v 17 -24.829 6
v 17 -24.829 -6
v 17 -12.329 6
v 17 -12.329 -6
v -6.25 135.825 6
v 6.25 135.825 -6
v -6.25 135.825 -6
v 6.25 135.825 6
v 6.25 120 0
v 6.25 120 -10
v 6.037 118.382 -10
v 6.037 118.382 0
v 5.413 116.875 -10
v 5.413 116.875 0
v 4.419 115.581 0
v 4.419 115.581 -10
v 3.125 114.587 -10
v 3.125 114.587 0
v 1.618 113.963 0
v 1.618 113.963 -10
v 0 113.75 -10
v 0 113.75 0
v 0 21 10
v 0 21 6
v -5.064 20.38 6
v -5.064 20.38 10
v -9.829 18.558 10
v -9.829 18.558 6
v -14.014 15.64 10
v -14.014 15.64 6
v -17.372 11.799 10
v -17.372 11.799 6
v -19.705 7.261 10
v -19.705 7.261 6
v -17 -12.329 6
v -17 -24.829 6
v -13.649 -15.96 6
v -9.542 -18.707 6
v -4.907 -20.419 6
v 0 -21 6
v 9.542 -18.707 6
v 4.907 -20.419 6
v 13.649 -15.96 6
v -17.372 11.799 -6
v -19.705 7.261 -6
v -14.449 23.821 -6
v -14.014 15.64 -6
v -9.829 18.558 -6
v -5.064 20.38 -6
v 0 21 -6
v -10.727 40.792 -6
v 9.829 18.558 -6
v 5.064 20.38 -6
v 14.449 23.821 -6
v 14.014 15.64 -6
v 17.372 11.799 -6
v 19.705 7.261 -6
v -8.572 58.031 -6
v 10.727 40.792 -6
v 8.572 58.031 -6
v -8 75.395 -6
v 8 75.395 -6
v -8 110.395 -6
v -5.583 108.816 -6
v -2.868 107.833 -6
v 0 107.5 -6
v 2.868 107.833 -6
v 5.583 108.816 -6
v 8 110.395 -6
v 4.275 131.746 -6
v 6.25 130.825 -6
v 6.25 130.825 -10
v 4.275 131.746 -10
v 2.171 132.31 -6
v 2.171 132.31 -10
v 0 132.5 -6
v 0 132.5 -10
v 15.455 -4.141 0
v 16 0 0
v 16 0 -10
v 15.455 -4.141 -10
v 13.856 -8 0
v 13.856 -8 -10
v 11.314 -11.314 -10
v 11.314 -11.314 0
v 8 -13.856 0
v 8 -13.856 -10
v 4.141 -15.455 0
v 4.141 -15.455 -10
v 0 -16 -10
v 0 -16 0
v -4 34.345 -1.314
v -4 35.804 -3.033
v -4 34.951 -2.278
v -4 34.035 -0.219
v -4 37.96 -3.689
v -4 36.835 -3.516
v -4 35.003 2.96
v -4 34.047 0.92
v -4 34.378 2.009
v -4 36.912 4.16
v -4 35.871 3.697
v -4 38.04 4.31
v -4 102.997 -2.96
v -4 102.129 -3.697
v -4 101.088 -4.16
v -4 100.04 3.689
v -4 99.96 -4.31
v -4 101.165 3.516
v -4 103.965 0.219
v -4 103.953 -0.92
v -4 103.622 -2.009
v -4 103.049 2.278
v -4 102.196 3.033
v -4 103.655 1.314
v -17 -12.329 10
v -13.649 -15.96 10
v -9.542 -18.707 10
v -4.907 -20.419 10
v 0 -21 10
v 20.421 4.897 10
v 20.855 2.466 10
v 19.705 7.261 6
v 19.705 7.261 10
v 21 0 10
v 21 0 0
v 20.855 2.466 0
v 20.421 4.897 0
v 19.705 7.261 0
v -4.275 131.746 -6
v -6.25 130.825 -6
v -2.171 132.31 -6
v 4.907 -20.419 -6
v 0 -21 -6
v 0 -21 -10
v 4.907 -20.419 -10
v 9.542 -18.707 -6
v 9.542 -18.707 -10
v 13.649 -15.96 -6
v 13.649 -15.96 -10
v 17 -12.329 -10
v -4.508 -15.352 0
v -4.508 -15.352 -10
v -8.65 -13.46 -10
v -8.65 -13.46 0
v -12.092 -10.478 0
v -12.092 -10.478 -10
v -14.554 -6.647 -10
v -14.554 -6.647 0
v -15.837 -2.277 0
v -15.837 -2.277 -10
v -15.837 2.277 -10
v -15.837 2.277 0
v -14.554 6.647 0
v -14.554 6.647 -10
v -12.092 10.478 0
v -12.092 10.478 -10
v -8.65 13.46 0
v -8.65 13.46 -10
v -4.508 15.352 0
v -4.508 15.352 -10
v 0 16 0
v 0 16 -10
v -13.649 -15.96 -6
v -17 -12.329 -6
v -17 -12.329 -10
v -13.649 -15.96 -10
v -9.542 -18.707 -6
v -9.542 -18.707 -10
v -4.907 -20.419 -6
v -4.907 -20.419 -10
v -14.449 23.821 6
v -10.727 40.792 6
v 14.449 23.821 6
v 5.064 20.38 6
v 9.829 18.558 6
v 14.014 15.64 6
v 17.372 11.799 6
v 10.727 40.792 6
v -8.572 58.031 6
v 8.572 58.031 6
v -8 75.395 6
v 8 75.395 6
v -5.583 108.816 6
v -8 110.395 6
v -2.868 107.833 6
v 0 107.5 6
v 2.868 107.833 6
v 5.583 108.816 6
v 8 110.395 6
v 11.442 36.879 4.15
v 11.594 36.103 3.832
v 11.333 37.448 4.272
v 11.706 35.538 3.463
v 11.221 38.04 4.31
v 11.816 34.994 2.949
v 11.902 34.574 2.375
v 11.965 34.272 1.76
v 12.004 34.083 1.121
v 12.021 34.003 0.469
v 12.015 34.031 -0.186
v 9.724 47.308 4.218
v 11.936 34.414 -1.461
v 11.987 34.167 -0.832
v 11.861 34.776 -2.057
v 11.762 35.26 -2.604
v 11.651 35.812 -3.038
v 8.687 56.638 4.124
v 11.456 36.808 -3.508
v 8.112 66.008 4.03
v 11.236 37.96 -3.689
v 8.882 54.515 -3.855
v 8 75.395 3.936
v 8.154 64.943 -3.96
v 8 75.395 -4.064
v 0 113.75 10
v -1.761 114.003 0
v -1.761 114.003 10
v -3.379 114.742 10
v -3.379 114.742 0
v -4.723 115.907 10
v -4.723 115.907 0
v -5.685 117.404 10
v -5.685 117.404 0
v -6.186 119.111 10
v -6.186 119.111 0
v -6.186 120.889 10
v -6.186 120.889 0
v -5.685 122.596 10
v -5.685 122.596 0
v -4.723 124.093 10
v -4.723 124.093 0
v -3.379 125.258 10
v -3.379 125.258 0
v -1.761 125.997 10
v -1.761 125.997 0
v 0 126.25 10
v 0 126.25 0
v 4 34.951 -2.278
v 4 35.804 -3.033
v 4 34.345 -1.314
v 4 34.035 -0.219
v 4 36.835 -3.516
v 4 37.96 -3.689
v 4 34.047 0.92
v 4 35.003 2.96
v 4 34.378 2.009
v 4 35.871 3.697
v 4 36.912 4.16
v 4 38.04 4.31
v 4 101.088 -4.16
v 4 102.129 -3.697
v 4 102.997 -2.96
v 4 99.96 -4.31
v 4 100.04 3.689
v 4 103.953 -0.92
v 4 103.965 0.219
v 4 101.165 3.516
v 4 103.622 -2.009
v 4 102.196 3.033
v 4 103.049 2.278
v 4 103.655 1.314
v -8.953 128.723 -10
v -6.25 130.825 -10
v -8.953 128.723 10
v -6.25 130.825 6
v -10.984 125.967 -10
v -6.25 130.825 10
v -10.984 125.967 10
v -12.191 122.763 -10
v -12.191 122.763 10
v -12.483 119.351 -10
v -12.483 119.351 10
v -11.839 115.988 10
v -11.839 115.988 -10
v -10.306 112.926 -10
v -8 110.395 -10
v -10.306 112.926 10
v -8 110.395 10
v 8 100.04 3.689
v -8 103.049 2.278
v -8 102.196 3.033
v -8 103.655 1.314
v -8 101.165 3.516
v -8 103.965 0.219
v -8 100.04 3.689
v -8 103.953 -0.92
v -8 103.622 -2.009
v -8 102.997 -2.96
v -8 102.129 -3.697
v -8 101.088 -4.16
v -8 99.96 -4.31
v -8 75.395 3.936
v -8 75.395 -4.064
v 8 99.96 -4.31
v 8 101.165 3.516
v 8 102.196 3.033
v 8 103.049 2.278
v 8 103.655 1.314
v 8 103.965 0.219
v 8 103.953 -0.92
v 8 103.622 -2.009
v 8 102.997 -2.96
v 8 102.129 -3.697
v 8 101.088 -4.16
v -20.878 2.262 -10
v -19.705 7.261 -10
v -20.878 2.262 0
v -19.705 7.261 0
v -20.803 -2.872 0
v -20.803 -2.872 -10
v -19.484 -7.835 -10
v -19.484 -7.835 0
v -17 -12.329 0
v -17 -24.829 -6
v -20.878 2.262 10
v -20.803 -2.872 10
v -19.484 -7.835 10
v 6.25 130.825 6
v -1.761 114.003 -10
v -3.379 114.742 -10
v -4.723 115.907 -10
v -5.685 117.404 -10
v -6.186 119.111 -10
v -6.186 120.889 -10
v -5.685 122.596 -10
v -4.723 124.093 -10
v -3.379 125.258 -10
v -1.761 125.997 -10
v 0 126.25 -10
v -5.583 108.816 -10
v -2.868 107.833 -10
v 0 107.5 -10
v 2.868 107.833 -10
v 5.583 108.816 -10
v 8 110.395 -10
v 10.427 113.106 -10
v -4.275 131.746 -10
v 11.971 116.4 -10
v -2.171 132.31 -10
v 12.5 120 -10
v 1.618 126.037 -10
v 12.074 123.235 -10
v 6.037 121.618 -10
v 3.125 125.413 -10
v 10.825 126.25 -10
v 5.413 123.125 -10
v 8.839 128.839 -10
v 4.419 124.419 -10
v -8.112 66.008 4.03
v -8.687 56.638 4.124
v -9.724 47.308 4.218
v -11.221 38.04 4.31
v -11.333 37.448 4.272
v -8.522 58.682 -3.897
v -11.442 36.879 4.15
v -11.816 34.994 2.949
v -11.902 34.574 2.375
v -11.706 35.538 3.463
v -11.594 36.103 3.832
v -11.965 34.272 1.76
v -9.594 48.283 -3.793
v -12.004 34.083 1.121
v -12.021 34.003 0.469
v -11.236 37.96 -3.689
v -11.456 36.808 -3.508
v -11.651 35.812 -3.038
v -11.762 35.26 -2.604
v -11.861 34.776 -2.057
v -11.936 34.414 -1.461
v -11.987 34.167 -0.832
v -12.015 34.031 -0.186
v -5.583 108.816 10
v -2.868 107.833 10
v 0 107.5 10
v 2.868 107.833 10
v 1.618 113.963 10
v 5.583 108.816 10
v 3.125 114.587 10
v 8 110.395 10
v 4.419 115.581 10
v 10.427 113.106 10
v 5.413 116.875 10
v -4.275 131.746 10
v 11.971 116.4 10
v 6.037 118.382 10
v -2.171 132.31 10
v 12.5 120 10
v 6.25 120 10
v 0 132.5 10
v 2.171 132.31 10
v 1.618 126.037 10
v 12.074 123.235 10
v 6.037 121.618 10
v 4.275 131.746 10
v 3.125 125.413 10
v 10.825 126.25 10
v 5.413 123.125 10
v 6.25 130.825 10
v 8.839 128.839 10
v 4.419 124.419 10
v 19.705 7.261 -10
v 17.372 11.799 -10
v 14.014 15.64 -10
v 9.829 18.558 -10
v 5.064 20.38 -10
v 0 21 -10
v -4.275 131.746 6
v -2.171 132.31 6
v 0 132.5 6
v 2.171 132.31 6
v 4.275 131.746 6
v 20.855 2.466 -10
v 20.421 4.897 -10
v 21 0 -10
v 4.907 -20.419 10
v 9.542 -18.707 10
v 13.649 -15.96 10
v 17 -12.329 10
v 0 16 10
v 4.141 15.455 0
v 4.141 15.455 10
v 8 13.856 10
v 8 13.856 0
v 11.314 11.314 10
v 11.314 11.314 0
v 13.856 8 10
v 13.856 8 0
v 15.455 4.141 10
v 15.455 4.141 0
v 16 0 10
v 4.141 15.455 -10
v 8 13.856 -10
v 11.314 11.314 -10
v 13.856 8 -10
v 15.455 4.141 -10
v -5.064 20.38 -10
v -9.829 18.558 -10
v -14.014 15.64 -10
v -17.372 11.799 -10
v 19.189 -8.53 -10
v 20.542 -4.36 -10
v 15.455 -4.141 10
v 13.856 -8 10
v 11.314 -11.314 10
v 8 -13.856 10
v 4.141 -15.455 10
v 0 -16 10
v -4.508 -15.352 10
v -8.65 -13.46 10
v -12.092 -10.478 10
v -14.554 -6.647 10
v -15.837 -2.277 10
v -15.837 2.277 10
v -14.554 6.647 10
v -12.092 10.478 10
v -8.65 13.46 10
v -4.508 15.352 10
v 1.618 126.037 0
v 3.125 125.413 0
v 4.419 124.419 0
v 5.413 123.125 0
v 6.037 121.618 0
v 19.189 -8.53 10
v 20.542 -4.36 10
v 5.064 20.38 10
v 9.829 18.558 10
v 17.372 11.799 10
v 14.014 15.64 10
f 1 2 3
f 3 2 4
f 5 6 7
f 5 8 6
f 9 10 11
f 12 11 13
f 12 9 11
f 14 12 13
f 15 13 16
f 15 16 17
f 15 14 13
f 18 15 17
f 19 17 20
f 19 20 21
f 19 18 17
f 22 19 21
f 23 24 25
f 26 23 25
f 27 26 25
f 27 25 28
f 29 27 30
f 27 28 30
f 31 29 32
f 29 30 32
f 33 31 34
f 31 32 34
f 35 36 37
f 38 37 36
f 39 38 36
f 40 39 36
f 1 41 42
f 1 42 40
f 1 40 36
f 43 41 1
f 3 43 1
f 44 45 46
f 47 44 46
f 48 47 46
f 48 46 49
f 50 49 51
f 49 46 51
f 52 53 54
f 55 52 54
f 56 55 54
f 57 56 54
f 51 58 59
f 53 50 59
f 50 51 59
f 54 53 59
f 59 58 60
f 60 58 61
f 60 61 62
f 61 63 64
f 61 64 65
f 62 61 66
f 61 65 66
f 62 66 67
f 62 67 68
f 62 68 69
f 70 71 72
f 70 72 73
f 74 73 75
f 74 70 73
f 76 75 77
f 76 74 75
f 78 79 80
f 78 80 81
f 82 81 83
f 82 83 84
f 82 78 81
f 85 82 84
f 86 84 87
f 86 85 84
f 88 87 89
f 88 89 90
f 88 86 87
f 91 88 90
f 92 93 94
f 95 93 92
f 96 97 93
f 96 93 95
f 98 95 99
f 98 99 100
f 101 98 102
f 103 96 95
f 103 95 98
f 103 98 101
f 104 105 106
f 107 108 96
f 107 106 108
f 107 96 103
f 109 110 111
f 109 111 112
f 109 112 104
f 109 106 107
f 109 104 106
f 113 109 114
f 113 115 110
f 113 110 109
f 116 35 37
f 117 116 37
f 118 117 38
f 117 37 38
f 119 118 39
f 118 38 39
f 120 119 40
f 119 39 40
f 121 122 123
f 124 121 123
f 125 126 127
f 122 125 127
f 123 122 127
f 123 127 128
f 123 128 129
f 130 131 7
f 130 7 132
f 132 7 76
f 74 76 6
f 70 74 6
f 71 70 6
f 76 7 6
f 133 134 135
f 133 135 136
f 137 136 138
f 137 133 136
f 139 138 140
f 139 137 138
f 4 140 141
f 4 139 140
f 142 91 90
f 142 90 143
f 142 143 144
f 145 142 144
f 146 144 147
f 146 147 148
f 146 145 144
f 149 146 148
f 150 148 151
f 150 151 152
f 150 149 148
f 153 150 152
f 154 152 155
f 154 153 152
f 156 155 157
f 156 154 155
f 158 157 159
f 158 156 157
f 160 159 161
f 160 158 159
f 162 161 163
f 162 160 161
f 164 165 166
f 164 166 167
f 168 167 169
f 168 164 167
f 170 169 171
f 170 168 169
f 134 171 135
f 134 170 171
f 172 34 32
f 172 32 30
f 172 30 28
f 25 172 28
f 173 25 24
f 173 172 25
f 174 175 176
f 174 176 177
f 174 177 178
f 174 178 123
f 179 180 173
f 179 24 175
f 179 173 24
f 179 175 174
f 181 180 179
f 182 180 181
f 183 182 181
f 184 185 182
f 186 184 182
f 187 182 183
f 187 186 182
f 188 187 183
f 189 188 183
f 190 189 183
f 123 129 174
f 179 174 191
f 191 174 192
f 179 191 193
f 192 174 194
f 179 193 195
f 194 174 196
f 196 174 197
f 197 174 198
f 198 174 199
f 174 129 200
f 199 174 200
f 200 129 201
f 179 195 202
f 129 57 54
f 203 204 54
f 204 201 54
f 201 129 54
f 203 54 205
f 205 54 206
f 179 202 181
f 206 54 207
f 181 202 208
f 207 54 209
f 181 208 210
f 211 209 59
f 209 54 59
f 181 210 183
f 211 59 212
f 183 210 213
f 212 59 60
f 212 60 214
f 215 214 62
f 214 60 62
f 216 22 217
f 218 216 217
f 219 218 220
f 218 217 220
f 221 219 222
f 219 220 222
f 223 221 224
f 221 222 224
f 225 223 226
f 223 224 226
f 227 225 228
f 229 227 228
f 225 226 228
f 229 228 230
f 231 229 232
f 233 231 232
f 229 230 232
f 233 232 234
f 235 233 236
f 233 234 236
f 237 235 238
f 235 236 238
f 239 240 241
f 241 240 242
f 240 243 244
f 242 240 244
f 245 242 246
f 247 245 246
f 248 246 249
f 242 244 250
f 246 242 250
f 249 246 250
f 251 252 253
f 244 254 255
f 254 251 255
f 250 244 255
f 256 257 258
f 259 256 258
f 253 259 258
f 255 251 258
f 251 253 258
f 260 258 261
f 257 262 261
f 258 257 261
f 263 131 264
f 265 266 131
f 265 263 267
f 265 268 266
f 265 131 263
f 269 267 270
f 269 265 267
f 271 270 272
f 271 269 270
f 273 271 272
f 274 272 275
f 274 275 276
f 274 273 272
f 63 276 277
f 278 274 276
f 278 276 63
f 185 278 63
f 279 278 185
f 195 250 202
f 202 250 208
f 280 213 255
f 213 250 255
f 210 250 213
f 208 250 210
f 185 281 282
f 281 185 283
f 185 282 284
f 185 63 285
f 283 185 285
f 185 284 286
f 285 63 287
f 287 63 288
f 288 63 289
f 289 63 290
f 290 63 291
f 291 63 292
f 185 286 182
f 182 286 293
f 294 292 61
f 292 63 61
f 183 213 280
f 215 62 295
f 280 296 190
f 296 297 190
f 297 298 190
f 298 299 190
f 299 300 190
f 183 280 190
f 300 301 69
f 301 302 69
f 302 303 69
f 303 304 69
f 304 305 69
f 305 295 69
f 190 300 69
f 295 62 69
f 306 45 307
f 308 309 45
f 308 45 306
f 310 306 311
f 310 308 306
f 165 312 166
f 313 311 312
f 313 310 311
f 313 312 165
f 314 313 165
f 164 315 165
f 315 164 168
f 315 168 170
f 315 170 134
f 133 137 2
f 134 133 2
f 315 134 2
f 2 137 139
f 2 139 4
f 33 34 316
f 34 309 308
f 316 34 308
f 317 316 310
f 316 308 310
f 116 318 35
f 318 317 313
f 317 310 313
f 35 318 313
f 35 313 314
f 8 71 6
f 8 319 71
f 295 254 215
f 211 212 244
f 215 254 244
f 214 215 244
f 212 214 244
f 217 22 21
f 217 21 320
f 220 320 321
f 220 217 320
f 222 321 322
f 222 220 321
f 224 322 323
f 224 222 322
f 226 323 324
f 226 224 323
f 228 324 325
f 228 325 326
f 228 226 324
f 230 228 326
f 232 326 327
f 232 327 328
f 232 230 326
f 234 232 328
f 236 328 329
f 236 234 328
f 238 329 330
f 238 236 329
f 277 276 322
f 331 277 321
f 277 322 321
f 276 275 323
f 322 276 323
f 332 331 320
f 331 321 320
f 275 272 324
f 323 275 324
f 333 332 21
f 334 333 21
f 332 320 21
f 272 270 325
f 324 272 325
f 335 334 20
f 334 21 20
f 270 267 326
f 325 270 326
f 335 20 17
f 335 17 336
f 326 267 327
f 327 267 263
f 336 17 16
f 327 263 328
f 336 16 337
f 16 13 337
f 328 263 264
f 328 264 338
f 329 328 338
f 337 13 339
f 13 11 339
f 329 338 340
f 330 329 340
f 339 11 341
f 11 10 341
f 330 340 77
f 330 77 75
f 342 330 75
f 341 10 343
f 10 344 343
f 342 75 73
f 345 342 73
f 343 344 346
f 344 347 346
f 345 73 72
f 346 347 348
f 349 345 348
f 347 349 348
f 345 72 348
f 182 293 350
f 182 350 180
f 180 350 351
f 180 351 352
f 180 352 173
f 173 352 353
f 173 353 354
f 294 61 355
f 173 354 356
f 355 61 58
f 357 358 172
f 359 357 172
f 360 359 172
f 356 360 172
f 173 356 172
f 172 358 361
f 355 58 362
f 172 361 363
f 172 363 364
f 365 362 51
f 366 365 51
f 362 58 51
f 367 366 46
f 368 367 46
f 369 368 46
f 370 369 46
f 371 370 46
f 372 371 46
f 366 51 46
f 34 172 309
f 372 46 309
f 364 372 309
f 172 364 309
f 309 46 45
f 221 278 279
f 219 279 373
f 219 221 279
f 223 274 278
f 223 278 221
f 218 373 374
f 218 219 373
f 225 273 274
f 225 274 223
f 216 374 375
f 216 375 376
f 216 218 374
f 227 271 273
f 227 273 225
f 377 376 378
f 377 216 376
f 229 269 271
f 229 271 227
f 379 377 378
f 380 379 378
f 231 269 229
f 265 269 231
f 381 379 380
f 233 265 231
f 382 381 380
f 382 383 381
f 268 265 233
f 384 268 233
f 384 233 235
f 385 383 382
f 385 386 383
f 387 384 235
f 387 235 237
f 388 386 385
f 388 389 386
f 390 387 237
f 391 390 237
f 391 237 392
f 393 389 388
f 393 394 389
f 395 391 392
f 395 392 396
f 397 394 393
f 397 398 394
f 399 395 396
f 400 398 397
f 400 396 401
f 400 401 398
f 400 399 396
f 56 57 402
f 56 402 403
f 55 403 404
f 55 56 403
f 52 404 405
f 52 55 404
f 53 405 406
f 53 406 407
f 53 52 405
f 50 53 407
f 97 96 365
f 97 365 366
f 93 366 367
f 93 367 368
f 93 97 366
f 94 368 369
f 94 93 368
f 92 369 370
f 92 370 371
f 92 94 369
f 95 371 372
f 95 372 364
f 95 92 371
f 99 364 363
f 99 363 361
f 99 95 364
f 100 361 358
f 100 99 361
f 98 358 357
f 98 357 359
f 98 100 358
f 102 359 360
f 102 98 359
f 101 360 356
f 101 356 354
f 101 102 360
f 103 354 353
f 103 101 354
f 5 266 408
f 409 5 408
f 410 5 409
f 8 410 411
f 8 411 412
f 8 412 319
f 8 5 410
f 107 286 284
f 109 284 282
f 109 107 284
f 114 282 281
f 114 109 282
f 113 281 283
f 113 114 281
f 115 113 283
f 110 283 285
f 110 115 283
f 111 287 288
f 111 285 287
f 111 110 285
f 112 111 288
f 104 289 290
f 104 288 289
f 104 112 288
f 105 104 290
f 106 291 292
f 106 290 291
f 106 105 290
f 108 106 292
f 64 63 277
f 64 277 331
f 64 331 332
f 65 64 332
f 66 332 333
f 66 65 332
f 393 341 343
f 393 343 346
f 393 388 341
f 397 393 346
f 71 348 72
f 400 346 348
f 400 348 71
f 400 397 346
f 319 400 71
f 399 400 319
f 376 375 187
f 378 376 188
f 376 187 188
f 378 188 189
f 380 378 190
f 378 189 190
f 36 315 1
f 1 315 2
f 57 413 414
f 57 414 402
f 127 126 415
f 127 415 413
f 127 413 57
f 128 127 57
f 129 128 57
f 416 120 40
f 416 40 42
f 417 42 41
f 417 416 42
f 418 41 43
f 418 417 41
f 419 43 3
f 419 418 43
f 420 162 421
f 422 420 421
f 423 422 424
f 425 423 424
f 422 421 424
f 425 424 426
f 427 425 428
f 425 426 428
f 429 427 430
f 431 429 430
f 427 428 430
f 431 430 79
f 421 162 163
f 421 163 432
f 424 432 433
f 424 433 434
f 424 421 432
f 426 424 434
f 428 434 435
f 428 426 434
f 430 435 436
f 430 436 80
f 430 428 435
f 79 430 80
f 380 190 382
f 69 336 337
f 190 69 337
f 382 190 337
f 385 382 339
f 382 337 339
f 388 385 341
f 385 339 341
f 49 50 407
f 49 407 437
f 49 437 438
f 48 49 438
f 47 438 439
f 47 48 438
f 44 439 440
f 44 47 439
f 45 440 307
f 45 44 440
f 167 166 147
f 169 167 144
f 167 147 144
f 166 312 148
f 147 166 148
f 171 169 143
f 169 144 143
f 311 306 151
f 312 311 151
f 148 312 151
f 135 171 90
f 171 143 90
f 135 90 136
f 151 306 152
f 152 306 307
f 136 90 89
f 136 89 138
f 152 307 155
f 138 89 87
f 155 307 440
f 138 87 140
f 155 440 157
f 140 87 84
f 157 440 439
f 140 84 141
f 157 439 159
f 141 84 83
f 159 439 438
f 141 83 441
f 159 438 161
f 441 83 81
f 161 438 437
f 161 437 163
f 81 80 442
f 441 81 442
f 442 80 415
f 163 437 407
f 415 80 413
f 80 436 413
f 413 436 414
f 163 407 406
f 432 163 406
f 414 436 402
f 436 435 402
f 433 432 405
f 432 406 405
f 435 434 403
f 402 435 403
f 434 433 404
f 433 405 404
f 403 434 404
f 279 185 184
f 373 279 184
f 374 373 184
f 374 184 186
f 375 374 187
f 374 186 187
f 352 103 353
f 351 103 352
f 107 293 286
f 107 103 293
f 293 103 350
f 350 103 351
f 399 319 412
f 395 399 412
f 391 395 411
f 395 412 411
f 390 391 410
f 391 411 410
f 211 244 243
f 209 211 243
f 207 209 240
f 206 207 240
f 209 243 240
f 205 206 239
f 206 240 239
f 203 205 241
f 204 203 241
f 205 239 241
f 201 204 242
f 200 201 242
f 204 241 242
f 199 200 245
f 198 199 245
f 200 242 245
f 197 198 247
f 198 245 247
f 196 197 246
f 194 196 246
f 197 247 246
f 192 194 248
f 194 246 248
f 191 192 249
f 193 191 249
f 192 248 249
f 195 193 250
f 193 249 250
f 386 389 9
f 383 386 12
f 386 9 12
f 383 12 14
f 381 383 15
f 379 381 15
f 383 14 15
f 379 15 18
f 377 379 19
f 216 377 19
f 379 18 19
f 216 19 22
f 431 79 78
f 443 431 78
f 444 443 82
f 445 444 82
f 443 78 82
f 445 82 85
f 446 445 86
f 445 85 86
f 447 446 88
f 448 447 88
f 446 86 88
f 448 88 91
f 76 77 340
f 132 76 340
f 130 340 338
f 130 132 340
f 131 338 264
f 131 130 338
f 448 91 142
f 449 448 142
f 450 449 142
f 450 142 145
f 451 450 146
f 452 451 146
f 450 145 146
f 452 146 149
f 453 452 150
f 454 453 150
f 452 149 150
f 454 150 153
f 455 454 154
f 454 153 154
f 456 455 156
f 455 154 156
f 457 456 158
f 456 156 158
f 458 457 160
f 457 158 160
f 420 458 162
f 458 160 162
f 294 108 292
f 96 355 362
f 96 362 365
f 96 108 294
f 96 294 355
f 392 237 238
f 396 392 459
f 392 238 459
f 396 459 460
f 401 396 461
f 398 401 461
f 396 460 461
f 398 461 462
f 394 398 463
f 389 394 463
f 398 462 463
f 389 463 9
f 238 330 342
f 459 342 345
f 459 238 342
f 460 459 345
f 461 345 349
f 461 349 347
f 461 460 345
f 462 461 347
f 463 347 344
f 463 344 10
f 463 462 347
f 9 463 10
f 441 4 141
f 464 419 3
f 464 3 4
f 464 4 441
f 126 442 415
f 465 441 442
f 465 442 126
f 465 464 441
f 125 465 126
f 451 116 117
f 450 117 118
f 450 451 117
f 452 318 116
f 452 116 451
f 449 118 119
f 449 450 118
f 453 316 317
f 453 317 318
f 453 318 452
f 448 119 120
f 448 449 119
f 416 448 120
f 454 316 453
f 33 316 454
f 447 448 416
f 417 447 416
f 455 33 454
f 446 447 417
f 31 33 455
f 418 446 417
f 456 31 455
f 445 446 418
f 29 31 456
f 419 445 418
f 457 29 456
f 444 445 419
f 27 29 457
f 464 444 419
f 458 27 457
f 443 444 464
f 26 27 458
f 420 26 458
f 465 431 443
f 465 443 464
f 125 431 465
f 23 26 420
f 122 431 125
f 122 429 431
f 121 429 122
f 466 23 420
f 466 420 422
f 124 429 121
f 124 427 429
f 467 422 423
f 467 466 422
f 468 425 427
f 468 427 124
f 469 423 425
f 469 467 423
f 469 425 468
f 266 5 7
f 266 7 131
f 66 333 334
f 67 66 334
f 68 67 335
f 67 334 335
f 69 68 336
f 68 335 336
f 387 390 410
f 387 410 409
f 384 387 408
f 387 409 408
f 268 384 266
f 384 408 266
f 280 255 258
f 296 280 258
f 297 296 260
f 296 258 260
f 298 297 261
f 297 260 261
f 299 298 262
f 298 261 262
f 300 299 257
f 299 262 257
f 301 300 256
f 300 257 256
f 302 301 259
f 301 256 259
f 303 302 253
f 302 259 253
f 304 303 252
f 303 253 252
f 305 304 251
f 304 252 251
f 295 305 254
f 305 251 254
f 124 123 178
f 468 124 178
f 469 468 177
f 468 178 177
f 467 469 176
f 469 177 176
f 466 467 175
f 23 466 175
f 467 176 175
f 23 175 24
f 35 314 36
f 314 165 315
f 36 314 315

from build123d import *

# Parameters (mm, degrees)
SKETCH1_R             = 12.5
SKETCH1_R_2           = 6.25
BOSS_EXTRUDE2_DEPTH   = 10
SKETCH1_R_3           = 21
SKETCH1_R_4           = 16
BOSS_EXTRUDE2_2_DEPTH = 10
BOSS_EXTRUDE3_DEPTH   = 6
CUT_EXTRUDE1_START    = 4
CUT_EXTRUDE1_DEPTH    = 140.802456026


with BuildPart() as part:
    # Sketch1 → Boss-Extrude2 (new, symmetric)
    with BuildSketch(Plane.XY):
        with Locations((0, 120)):
            Circle(SKETCH1_R)
        with Locations((0, 120)):
            Circle(SKETCH1_R_2, mode=Mode.SUBTRACT)
    extrude(amount=BOSS_EXTRUDE2_DEPTH, both=True)



with BuildPart() as body_2:
    # Sketch1 → Boss-Extrude2 2 (new, symmetric)
    with BuildSketch(Plane.XY):
        Circle(SKETCH1_R_3)
        Circle(SKETCH1_R_4, mode=Mode.SUBTRACT)
    extrude(amount=BOSS_EXTRUDE2_2_DEPTH, both=True)


with BuildPart() as part_1:
    add(part.part)

    add(body_2.part)  # Boss-Extrude3 merges body 2
    # Sketch1<7> → Boss-Extrude3 (add, symmetric)
    with BuildSketch(Plane.XY):
        with BuildLine():
            Line((6.25, 135.825317547), (-6.25, 135.825317547))
            Line((-6.25, 135.825317547), (-6.25, 130.825317547))
            ThreePointArc((-6.25, 130.825317547), (0, 132.5), (6.25, 130.825317547))
            Line((6.25, 130.825317547), (6.25, 135.825317547))
        make_face()
        with BuildLine():
            Line((-8, 110.395313644), (-8, 75.395313644))
            ThreePointArc((-8, 75.395313644), (-10.727396888, 40.791551261), (-19.704607906, 7.261434244))
            ThreePointArc((-19.704607906, 7.261434244), (0, 21), (19.704607906, 7.261434244))
            ThreePointArc((19.704607906, 7.261434244), (10.727396888, 40.791551261), (8, 75.395313644))
            Line((8, 75.395313644), (8, 110.395313644))
            ThreePointArc((8, 110.395313644), (0, 107.5), (-8, 110.395313644))
        make_face()
        with BuildLine():
            Line((-17, -12.328828006), (-17, -24.828828006))
            Line((-17, -24.828828006), (17, -24.828828006))
            Line((17, -24.828828006), (17, -12.328828006))
            ThreePointArc((17, -12.328828006), (0, -21), (-17, -12.328828006))
        make_face()
    extrude(amount=BOSS_EXTRUDE3_DEPTH, both=True)

    # Sketch2 → Cut-Extrude1 (cut)
    with BuildSketch(Plane(origin=(0, 0, 0), x_dir=(0, 0, -1), z_dir=(1, 0, 0)).offset(CUT_EXTRUDE1_START)):
        with BuildLine():
            Line((4.310429138, 99.95992073), (3.689169265, 37.95992073))
            ThreePointArc((3.689169265, 37.95992073), (-0.350709206, 34.000200799), (-4.310429138, 38.04007927))
            Line((-4.310429138, 38.04007927), (-3.689169265, 100.04007927))
            ThreePointArc((-3.689169265, 100.04007927), (0.350709206, 103.999799201), (4.310429138, 99.95992073))
        make_face()
    cut_extrude1 = extrude(amount=CUT_EXTRUDE1_DEPTH, mode=Mode.SUBTRACT)

    # Mirror1: Cut-Extrude1 across plane
    add(cut_extrude1.mirror(Plane(origin=(0, 0, 0), x_dir=(0, 0, 1), z_dir=(1, 0, 0))), mode=Mode.SUBTRACT)


solid = part_1.part
